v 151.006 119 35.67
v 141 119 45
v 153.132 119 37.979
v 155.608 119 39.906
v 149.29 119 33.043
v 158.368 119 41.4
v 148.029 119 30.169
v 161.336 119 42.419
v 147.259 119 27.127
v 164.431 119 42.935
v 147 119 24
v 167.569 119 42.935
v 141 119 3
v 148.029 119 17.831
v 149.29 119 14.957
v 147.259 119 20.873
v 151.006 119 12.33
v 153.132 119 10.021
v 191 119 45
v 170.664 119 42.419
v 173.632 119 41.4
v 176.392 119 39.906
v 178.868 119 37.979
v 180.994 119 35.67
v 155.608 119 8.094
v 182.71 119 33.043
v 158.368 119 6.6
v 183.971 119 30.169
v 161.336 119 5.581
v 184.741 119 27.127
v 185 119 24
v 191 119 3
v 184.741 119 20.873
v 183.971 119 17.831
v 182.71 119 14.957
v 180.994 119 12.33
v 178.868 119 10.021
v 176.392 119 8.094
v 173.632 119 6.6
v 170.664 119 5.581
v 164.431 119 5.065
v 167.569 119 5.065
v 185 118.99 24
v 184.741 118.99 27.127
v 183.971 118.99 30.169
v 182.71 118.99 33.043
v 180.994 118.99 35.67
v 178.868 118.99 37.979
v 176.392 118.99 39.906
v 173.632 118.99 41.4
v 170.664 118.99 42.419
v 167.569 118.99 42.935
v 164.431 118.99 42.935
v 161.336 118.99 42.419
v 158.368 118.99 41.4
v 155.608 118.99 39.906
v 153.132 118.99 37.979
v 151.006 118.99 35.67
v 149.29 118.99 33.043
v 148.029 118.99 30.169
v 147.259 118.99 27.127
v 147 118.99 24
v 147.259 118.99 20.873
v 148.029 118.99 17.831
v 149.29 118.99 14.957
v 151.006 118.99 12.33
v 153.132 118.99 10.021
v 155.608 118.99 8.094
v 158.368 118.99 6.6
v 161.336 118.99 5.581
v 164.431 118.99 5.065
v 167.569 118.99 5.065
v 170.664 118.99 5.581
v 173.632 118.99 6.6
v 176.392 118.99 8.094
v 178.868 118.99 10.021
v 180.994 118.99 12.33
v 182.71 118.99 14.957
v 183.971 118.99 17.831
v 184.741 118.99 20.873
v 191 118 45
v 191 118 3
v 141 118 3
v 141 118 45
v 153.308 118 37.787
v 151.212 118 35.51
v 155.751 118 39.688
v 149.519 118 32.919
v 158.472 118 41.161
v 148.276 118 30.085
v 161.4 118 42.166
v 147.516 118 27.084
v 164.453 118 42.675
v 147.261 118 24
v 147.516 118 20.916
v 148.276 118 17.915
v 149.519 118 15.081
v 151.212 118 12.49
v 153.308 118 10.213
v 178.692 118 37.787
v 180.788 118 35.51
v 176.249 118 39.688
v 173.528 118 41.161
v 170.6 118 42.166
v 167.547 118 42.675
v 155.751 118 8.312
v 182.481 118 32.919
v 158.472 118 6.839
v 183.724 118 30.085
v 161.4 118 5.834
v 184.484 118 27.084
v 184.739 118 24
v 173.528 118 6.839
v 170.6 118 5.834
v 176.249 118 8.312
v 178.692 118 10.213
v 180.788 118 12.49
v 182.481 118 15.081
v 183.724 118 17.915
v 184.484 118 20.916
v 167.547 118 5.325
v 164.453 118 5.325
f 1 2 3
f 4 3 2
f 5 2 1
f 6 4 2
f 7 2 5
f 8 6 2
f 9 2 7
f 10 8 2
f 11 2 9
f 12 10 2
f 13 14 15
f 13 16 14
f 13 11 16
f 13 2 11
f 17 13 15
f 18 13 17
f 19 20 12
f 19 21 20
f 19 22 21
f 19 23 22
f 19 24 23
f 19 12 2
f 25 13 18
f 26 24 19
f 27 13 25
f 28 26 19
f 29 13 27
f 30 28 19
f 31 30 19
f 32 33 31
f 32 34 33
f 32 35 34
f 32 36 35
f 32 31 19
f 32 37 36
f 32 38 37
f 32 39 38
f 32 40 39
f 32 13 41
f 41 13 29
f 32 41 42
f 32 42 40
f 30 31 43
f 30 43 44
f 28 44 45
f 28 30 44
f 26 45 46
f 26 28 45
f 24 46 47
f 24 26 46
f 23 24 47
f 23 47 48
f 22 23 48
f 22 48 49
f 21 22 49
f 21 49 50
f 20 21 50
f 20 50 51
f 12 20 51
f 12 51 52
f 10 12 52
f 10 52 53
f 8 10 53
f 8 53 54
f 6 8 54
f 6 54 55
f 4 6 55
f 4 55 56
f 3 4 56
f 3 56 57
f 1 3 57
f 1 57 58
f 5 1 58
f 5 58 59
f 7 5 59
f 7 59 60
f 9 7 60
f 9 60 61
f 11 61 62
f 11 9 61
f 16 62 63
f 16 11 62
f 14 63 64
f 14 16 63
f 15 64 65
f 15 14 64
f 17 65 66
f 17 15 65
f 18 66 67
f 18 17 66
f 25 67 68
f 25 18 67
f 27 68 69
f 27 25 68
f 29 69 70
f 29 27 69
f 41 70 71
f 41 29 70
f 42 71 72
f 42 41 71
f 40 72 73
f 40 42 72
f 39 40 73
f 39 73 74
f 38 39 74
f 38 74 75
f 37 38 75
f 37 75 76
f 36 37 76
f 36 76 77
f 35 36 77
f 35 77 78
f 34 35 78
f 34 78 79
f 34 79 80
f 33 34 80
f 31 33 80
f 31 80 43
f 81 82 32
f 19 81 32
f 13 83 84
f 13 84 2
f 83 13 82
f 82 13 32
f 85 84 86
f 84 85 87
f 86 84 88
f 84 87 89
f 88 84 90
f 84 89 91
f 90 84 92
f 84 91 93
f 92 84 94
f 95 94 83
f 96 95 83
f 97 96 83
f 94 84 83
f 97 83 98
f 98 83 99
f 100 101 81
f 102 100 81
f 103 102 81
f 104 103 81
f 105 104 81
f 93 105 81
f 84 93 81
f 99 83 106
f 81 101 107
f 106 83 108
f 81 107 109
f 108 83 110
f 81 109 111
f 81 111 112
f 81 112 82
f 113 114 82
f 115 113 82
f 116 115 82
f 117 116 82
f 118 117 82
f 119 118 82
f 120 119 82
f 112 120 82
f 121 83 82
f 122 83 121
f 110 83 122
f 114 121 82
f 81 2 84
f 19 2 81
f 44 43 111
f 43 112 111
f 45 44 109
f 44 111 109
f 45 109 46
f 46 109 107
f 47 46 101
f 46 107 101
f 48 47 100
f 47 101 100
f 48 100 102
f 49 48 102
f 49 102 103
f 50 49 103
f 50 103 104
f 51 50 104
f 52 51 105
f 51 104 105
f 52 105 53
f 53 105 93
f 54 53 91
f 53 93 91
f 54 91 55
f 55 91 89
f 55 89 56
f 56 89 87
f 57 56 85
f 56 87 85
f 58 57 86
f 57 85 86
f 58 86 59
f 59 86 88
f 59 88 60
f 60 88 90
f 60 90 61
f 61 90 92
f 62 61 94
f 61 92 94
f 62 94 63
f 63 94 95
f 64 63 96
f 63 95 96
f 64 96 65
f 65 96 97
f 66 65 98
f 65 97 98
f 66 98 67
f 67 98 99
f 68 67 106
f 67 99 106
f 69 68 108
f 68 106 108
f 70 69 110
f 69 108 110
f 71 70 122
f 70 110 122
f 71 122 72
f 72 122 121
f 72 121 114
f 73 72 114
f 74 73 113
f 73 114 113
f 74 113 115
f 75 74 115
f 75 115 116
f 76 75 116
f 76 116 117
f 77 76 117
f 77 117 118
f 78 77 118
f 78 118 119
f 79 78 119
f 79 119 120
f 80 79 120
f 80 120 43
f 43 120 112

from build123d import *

# Parameters (mm, degrees)
CYLINDER066_R                = 19
CYLINDER066_DEPTH            = 21
CHAMFER011006003017057_SIZE2 = 5
CHAMFER011006003017057_SIZE  = 18.99
BOX085140_W                  = 50
BOX085140_H                  = 1
BOX085140_DEPTH              = 42


with BuildPart() as chamfer011006003017057:
    # Cylinder066 → Cylinder066 (new body)
    with BuildSketch(Plane(origin=(166, 121, 24), x_dir=(1, 0, 0), z_dir=(0, -1, 0))):
        Circle(CYLINDER066_R)
    extrude(amount=CYLINDER066_DEPTH)

    # Chamfer011006003017057
    chamfer011006003017057_edges = [chamfer011006003017057.edges().sort_by_distance(p)[0] for p in [
        (147, 100, 24),
    ]]
    chamfer011006003017057_side = chamfer011006003017057.faces().sort_by_distance((147, 110.5, 24))[0]
    chamfer(chamfer011006003017057_edges, length=CHAMFER011006003017057_SIZE, length2=CHAMFER011006003017057_SIZE2, reference=chamfer011006003017057_side)


with BuildPart() as cut001002016050:
    # Box085140 → Box085140 (new body)
    with BuildSketch(Plane(origin=(141, 118, 3), x_dir=(1, 0, 0), z_dir=(0, 0, 1))):
        with Locations((25, 0.5)):
            Rectangle(BOX085140_W, BOX085140_H)
    extrude(amount=BOX085140_DEPTH)

    # Cut001002016050: cut Chamfer011006003017057
    add(chamfer011006003017057.part, mode=Mode.SUBTRACT)


solid = cut001002016050.part
